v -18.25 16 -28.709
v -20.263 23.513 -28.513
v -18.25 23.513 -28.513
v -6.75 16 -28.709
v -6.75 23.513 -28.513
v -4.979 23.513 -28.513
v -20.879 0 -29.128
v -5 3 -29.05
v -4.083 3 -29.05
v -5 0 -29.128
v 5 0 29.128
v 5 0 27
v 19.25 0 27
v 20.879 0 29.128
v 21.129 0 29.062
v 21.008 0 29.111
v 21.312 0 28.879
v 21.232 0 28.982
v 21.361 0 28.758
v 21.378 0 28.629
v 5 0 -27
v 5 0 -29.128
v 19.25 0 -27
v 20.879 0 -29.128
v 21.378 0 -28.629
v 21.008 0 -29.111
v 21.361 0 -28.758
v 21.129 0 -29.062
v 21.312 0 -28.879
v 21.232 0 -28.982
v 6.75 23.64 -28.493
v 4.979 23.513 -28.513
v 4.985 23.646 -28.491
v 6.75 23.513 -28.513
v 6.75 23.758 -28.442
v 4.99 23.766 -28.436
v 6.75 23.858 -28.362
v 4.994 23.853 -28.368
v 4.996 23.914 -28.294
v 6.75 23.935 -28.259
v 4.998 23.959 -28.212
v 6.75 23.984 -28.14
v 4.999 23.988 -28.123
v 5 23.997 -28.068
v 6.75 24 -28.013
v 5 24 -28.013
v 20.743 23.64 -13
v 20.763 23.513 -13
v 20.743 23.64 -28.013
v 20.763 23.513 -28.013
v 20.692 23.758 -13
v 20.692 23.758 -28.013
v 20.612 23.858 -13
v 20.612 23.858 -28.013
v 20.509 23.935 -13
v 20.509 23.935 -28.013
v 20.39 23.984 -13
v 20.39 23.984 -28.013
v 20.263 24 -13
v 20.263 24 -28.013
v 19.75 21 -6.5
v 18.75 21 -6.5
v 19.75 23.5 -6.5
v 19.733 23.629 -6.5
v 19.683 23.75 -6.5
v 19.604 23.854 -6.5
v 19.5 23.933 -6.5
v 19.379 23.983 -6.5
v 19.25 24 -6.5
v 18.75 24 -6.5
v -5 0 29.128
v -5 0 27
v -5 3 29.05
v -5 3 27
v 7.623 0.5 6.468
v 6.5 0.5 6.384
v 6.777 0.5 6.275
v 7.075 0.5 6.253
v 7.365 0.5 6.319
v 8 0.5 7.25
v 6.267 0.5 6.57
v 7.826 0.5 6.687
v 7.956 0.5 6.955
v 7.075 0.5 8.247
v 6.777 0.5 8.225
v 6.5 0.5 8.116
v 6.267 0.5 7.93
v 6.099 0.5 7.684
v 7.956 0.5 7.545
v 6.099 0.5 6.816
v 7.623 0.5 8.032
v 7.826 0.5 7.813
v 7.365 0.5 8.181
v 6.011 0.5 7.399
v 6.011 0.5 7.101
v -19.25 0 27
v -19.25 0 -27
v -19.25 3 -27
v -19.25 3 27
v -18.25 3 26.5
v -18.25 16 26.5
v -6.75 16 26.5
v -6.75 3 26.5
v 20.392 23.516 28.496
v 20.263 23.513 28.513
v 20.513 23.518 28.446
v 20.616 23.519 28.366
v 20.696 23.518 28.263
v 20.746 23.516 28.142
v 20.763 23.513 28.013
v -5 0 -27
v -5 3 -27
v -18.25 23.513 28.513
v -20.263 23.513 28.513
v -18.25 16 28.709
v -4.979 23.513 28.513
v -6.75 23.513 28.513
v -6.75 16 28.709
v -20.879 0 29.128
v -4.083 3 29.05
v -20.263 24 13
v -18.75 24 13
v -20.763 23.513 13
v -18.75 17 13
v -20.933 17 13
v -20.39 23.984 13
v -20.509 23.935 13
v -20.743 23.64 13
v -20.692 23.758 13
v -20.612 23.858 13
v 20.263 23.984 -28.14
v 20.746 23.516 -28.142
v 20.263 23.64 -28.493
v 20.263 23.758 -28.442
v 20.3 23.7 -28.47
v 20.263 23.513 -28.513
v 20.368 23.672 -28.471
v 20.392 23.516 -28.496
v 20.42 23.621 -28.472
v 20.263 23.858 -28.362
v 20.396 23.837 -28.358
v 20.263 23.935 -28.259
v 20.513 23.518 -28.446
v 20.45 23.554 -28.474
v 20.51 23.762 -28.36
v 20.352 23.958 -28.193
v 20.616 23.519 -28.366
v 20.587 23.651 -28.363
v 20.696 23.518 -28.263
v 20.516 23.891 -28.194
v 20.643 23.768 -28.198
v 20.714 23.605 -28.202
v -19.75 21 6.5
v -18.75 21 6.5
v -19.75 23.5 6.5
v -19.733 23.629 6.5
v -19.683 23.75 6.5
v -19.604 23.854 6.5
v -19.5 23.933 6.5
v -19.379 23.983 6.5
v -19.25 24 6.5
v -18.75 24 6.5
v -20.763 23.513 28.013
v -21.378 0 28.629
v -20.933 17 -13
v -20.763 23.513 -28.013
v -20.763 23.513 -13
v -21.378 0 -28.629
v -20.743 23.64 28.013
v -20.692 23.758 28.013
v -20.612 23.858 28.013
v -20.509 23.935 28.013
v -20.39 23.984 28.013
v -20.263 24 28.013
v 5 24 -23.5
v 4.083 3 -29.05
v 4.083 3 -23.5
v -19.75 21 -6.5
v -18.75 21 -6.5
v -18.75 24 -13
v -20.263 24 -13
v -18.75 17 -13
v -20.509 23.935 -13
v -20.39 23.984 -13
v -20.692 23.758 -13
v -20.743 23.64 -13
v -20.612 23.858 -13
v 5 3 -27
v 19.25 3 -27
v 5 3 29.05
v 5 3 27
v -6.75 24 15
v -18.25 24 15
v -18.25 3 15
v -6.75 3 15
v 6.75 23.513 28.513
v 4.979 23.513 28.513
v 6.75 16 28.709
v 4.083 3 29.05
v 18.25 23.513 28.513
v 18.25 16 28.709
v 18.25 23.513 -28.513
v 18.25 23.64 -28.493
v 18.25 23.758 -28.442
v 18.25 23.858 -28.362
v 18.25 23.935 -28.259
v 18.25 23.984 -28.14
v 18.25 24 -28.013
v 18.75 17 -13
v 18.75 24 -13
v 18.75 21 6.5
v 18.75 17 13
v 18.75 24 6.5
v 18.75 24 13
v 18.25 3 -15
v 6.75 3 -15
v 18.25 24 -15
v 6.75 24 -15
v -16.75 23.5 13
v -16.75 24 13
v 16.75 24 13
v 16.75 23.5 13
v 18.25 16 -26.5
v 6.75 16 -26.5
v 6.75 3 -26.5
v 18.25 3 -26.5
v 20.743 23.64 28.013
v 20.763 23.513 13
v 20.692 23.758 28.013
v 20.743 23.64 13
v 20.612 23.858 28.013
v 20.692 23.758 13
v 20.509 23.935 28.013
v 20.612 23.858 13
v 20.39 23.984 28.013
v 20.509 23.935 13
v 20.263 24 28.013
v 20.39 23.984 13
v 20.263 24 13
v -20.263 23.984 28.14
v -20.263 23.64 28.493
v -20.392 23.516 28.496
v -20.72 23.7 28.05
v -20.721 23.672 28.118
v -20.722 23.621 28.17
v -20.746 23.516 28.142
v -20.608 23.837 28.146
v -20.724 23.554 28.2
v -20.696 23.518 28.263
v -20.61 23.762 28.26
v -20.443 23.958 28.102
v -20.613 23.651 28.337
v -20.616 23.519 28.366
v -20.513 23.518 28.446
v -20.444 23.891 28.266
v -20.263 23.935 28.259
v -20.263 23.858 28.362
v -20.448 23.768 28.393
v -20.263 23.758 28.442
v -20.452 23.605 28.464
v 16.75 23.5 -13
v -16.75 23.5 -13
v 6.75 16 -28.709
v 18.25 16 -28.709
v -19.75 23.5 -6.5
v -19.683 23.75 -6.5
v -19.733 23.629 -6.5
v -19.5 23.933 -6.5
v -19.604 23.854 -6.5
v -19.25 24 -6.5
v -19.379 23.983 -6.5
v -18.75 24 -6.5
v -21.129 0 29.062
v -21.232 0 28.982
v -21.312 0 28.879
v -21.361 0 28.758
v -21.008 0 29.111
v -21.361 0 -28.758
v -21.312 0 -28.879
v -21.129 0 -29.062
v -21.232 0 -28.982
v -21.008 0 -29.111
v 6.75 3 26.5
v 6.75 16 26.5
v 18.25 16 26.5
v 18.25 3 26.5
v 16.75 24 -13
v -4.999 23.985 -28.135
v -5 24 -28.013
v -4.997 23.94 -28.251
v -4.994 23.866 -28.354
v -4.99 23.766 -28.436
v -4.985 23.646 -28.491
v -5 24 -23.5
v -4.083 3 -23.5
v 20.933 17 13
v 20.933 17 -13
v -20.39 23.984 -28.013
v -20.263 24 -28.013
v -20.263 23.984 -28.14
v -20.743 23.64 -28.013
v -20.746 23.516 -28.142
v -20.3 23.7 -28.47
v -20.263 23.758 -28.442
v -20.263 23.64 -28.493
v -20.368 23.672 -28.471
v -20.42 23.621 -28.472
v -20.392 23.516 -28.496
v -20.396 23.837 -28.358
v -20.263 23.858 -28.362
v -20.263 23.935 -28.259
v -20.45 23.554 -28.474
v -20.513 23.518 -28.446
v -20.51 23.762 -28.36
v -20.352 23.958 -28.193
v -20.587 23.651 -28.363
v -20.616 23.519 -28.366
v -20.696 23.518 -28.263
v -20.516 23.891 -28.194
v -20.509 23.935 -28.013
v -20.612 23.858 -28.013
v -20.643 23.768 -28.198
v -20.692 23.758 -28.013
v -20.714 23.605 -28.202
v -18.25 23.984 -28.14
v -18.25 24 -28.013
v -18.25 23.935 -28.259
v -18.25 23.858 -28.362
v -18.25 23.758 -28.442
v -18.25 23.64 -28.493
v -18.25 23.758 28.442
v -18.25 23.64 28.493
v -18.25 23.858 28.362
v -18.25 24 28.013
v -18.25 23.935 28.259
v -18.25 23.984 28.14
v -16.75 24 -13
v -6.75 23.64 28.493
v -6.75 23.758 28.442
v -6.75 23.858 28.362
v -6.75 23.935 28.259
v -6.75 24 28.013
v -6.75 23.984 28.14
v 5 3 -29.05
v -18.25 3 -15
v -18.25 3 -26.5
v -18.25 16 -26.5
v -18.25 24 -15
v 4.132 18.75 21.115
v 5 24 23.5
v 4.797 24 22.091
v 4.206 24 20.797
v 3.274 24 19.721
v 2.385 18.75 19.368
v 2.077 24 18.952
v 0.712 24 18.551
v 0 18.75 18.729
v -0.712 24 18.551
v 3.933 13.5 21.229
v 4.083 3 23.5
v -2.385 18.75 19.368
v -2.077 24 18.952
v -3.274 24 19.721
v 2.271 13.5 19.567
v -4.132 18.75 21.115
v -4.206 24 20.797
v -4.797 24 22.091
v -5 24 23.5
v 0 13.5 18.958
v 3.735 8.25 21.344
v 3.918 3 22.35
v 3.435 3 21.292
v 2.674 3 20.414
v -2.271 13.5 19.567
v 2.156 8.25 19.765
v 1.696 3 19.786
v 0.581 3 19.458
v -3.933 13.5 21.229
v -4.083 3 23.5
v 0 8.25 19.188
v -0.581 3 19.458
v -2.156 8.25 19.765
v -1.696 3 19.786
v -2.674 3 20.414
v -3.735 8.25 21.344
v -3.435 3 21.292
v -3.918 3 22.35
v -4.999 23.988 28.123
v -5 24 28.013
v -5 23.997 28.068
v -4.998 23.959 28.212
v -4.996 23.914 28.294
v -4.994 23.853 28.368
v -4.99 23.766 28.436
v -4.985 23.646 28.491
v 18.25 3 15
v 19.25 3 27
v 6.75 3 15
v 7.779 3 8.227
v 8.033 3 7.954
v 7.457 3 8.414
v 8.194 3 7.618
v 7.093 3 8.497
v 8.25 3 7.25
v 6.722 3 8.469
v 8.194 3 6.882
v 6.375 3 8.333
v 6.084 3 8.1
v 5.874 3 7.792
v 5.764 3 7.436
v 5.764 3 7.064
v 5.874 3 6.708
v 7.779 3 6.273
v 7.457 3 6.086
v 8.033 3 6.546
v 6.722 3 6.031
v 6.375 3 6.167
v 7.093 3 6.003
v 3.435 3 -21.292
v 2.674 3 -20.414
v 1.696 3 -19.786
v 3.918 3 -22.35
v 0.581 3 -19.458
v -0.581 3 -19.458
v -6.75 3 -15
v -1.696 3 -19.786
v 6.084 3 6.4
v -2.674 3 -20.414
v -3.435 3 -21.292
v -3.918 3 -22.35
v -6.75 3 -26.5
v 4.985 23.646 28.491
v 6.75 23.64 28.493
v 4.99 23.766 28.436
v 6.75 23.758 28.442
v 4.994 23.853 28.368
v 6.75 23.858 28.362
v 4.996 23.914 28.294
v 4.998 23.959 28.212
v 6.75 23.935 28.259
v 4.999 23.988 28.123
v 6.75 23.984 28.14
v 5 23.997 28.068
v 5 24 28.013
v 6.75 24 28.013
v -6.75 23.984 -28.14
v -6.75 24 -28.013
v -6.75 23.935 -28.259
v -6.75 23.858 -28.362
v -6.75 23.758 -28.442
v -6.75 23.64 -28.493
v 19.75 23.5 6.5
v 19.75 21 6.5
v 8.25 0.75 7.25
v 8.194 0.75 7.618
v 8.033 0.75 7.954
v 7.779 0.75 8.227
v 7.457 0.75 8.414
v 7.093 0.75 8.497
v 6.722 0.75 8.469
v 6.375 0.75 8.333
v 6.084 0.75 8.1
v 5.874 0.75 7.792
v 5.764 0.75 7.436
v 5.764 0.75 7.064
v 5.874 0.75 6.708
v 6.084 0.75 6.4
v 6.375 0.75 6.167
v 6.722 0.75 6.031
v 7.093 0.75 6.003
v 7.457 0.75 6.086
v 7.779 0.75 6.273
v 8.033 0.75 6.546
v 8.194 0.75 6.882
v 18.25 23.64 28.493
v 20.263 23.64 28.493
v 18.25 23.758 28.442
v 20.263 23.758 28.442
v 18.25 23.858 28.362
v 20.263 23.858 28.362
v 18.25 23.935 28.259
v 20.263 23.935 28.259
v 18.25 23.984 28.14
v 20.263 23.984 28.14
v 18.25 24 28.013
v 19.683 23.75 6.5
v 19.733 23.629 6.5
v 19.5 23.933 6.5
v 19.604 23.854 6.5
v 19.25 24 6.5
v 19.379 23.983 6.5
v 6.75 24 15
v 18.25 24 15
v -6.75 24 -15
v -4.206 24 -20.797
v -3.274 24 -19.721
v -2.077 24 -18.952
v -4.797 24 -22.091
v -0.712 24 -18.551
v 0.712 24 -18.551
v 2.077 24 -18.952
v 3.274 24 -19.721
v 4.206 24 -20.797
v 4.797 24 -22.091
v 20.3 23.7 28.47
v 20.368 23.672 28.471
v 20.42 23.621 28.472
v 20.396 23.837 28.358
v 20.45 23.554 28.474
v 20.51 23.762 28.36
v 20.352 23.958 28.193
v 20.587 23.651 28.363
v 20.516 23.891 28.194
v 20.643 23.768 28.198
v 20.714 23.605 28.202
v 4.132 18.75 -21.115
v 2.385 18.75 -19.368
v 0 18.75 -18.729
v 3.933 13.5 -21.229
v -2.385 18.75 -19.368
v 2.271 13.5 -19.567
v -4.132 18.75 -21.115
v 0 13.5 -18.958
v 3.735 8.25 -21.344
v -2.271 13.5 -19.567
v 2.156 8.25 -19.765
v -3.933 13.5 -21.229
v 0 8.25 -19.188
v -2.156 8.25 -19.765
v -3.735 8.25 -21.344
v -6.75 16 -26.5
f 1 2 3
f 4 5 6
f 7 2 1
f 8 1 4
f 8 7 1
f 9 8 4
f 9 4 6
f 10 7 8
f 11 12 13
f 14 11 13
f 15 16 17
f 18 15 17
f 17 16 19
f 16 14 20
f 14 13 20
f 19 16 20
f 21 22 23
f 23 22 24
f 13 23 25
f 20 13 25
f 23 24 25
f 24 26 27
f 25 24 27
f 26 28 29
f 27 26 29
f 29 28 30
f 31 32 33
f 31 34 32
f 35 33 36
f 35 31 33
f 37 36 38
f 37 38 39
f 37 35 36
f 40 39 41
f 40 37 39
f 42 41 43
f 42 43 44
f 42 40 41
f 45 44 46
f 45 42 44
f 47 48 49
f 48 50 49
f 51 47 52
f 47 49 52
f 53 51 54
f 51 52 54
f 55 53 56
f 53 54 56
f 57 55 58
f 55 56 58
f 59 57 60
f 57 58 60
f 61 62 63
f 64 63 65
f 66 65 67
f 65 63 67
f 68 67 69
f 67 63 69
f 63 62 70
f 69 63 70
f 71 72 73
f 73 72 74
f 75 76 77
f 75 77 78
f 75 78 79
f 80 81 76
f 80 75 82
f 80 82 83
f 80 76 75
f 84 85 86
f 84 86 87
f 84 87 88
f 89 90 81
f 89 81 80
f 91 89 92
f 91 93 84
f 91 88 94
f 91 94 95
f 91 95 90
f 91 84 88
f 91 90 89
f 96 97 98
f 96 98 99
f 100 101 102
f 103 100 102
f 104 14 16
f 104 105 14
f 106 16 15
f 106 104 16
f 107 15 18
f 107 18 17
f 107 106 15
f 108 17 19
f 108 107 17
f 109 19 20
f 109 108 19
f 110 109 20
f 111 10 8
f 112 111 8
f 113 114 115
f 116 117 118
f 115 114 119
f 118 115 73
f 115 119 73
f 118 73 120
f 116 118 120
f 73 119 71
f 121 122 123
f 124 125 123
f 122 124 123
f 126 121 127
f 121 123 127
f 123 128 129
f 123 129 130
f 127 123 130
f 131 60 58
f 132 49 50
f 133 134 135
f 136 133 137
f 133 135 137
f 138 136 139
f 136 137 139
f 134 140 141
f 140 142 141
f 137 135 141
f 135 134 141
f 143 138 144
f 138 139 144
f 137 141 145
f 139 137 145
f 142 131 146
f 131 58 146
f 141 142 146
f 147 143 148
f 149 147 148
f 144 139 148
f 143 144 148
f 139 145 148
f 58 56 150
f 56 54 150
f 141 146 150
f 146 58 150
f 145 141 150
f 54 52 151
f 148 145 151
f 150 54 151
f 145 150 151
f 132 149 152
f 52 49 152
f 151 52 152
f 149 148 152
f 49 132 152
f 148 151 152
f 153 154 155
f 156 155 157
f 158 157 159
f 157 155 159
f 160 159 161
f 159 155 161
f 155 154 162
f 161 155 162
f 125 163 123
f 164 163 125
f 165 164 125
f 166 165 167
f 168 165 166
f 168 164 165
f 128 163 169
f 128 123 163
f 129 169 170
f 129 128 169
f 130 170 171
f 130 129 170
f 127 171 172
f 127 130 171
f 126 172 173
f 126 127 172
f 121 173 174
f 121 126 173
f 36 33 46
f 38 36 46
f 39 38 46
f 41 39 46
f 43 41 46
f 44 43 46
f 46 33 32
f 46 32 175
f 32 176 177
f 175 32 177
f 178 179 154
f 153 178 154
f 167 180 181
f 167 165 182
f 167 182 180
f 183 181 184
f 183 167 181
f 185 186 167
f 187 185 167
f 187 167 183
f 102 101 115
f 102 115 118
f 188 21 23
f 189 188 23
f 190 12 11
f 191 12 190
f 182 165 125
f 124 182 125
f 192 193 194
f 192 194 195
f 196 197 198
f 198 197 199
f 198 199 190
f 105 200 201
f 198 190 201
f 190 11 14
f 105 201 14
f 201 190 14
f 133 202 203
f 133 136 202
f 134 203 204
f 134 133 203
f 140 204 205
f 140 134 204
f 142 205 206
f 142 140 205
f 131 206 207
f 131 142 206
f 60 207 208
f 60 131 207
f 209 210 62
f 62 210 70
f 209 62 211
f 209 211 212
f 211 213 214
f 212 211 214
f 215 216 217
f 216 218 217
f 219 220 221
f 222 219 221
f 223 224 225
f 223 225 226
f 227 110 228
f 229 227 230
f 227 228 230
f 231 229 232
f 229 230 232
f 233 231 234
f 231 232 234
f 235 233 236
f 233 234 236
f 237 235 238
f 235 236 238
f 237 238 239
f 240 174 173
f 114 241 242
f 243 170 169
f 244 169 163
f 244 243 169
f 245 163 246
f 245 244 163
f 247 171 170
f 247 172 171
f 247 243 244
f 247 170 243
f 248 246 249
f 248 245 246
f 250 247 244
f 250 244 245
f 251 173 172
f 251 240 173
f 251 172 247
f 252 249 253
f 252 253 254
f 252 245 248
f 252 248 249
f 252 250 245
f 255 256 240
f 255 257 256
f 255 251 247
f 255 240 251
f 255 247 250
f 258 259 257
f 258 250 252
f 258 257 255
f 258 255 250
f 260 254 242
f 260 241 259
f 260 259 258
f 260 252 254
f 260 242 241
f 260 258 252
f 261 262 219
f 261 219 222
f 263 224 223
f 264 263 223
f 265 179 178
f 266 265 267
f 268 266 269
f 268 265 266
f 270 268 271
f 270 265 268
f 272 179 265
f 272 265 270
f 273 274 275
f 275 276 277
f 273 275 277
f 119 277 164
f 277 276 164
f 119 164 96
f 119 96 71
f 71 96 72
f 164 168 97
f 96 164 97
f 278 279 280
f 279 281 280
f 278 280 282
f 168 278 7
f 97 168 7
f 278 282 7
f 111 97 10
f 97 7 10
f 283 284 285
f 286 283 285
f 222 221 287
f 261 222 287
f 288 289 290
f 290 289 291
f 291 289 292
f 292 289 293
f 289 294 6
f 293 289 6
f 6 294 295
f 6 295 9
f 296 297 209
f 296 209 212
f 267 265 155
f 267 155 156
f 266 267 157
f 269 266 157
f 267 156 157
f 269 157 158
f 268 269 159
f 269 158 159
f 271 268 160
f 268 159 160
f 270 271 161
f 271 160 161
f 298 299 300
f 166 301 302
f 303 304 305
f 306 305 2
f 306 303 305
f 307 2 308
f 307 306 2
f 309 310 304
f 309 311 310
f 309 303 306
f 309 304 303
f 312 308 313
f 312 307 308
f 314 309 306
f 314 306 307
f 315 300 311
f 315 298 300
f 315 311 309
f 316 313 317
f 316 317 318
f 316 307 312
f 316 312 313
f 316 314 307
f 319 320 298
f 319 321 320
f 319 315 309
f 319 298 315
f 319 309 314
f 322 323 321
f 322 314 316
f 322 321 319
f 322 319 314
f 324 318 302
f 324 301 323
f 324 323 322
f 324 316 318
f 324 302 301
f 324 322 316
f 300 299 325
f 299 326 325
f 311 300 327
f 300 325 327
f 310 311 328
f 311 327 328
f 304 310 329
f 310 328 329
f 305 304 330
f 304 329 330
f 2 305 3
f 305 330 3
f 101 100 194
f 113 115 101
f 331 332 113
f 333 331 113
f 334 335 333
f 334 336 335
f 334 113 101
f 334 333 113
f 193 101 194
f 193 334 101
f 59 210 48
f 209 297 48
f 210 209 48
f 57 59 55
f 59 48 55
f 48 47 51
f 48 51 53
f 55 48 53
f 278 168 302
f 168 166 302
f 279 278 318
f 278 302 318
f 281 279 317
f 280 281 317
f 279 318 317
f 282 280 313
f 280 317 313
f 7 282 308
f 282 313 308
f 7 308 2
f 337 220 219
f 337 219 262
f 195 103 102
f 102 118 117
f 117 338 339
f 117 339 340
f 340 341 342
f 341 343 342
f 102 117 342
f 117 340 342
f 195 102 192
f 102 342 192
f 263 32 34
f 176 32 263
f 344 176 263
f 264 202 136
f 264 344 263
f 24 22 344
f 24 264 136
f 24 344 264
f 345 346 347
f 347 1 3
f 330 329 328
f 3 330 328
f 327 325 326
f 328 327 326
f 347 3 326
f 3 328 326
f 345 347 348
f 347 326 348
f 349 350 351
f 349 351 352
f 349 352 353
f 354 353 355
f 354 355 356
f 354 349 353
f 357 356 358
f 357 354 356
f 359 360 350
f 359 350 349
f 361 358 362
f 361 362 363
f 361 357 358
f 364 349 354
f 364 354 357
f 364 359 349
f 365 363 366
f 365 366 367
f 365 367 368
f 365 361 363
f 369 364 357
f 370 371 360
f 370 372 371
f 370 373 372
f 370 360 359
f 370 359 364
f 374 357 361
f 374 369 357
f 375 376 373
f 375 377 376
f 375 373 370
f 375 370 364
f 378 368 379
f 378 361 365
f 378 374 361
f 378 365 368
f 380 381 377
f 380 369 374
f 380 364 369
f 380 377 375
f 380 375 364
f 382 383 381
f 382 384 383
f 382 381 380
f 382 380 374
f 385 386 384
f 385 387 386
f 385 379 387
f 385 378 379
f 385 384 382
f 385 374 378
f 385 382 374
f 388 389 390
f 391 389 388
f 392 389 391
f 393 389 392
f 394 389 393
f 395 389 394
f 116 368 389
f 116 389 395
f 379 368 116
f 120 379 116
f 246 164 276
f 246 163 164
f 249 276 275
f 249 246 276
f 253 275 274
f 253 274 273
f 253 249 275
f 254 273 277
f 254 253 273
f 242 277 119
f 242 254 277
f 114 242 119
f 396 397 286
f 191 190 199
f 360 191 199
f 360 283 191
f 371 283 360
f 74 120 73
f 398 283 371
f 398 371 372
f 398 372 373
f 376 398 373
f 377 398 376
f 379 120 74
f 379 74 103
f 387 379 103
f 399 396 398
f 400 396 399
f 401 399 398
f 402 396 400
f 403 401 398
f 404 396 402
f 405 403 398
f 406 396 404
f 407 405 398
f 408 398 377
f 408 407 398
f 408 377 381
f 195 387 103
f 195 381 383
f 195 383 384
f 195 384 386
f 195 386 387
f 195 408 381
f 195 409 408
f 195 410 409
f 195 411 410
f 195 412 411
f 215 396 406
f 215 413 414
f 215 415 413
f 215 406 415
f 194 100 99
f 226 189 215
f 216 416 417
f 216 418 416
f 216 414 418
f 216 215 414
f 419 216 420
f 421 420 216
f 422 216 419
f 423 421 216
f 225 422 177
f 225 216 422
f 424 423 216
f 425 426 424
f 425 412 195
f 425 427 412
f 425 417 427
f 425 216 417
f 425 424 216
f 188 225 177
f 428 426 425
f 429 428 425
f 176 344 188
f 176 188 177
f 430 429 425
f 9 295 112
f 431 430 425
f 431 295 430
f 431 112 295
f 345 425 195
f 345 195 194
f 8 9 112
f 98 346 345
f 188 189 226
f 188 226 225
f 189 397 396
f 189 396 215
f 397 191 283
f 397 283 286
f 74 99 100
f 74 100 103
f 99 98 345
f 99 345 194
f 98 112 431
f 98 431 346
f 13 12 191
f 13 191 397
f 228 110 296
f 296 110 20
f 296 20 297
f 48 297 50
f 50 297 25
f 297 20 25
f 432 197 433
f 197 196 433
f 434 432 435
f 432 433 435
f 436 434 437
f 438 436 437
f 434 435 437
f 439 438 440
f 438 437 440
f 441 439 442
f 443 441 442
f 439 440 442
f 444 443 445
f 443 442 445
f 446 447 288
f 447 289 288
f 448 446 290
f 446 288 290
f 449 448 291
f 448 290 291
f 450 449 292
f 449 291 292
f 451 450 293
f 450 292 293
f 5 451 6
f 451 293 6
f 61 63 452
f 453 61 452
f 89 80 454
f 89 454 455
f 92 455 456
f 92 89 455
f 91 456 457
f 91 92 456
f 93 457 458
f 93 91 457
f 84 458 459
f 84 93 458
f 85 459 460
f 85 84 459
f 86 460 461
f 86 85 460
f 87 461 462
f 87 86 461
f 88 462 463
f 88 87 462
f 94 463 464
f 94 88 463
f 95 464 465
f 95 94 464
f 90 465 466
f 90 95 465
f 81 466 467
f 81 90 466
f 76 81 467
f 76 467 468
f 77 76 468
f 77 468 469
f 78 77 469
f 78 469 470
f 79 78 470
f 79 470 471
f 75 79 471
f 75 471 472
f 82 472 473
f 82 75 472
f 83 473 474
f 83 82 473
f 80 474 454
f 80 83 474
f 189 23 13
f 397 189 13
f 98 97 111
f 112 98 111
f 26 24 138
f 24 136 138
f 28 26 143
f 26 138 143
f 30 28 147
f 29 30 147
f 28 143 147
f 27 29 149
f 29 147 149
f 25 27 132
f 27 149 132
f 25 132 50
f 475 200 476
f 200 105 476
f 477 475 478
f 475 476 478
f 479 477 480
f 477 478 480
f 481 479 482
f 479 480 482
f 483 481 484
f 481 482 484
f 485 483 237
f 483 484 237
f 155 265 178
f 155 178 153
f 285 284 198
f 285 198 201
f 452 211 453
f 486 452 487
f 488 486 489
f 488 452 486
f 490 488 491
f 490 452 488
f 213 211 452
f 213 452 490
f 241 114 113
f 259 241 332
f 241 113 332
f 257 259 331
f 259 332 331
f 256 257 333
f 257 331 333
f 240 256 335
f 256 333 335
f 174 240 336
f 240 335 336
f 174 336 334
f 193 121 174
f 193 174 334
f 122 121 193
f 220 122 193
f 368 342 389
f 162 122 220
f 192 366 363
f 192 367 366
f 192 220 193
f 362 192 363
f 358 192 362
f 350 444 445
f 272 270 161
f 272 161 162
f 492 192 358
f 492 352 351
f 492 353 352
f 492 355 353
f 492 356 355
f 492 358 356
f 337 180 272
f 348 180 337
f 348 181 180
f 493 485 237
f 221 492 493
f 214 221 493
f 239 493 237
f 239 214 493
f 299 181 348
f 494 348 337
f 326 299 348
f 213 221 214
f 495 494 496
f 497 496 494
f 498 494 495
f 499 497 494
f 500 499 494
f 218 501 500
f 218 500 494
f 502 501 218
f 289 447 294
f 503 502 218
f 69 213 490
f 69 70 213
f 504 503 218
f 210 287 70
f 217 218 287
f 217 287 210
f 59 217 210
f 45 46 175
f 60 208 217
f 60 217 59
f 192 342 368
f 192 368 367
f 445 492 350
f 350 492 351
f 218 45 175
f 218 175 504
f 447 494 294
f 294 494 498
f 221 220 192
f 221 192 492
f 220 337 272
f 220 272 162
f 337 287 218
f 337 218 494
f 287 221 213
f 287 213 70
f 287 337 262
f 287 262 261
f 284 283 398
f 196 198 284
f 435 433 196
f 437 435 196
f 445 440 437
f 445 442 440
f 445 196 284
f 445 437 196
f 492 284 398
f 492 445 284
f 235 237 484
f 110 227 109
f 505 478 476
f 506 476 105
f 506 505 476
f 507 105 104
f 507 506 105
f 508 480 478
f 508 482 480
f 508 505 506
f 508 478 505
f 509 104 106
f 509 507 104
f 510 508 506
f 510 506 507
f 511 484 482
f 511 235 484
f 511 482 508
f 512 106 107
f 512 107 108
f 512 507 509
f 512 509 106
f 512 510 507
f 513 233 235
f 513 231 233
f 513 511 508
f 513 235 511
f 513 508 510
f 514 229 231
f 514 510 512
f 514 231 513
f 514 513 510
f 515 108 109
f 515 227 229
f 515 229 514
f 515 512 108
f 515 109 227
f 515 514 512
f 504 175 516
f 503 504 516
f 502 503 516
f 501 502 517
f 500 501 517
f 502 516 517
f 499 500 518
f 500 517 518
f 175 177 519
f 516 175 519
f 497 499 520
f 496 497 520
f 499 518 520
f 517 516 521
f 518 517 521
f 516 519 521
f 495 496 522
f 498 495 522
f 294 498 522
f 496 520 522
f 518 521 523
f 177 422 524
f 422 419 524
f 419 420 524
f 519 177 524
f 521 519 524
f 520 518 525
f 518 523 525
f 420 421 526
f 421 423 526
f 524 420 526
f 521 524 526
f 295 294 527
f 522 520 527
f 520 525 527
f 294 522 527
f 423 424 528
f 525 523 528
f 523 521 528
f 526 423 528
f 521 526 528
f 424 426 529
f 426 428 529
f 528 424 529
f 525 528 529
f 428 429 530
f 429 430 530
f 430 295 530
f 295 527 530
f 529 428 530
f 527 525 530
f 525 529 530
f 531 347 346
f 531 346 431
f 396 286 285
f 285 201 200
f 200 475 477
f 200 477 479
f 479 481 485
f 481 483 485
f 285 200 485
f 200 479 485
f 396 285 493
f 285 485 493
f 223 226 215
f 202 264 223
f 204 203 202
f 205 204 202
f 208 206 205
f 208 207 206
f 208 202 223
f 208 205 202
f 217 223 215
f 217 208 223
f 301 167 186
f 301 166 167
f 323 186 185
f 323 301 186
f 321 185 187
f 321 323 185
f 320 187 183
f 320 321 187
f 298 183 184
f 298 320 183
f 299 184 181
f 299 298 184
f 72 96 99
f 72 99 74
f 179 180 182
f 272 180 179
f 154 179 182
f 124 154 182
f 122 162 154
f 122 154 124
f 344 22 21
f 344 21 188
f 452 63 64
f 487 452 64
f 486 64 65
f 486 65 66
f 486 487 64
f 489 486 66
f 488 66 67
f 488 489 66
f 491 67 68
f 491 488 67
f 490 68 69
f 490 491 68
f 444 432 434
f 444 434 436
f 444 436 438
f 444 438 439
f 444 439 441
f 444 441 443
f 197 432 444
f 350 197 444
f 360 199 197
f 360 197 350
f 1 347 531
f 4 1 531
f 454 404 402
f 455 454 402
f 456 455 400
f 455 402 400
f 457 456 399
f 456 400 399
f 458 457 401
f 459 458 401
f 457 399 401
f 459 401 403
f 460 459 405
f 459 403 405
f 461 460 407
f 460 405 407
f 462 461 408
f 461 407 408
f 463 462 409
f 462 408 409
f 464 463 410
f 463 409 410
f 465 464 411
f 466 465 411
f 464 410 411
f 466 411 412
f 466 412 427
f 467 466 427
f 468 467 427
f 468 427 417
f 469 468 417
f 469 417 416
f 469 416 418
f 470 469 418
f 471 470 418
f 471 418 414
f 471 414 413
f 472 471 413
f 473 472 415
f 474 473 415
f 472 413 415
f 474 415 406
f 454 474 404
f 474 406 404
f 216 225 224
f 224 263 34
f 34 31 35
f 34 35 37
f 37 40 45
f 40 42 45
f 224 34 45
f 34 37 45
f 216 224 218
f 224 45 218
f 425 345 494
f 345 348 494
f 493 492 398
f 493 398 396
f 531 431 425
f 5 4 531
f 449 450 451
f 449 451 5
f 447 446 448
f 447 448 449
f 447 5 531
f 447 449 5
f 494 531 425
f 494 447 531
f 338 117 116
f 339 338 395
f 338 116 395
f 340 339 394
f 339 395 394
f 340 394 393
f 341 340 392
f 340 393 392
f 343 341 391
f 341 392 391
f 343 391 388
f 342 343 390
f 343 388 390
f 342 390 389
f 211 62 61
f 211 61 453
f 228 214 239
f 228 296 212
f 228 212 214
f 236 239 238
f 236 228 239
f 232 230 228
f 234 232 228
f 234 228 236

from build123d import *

# Parameters (mm, degrees)
SKETCH1_W           = 41.5
SKETCH1_H           = 57
BOSS_EXTRUDE1_DEPTH = 24
CUT_EXTRUDE1_DEPTH  = 21
CUT_EXTRUDE1_TAPER  = 2.5
SKETCH3_W           = 11.5
SKETCH3_H           = 13.5
CUT_EXTRUDE2_DEPTH  = 8
SKETCH4_W           = 11.5
SKETCH4_H           = 11.5
CUT_EXTRUDE3_DEPTH  = 17.0000001
SKETCH5_W           = 26
SKETCH5_H           = 7
CUT_EXTRUDE4_DEPTH  = 2
SKETCH6_W           = 13
SKETCH6_H           = 3
BOSS_EXTRUDE2_DEPTH = 1
SKETCH7_W           = 33.5
SKETCH7_H           = 26
CUT_EXTRUDE5_DEPTH  = 0.5
SKETCH8_W           = 38.5
SKETCH8_H           = 54
CUT_EXTRUDE6_DEPTH  = 3
SKETCH9_W           = 10
SKETCH9_H           = 3
CUT_EXTRUDE7_DEPTH  = 58.0000001
DRAFT1_ANGLE        = 1.5
FILLET1_R           = 0.5
SKETCH10_R          = 1.25
BOSS_EXTRUDE3_DEPTH = 2.5
CHAMFER1_SIZE       = 0.25


with BuildPart() as part:
    # Sketch1 → Boss-Extrude1 (new body)
    with BuildSketch(Plane(origin=(0, 0, 0), x_dir=(1, 0, 0), z_dir=(0, 1, 0))):
        Rectangle(SKETCH1_W, SKETCH1_H)
    extrude(amount=BOSS_EXTRUDE1_DEPTH)

    # Sketch2 → Cut-Extrude1 (cut)
    with BuildSketch(Plane(origin=(0, 24, 0), x_dir=(1, 0, 0), z_dir=(0, 1, 0))):
        with BuildLine():
            Line((-5, -23.5), (-5, -30.5))
            Line((-5, -30.5), (5, -30.5))
            Line((5, -30.5), (5, -23.5))
            ThreePointArc((5, -23.5), (0, -18.5), (-5, -23.5))
        make_face()
    cut_extrude1 = extrude(amount=-CUT_EXTRUDE1_DEPTH, taper=CUT_EXTRUDE1_TAPER, mode=Mode.SUBTRACT)

    # Sketch3 → Cut-Extrude2 (cut)
    with BuildSketch(Plane(origin=(0, 24, 0), x_dir=(1, 0, 0), z_dir=(0, 1, 0))):
        with Locations((-12.5, -21.75)):
            Rectangle(SKETCH3_W, SKETCH3_H)
        with Locations((12.5, -21.75)):
            Rectangle(SKETCH3_W, SKETCH3_H)
    cut_extrude2 = extrude(amount=-CUT_EXTRUDE2_DEPTH, mode=Mode.SUBTRACT)

    # Sketch4 → Cut-Extrude3 (cut, through all)
    with BuildSketch(Plane(origin=(0, 16, 0), x_dir=(1, 0, 0), z_dir=(0, 1, 0))):
        with Locations((-12.5, -20.75)):
            Rectangle(SKETCH4_W, SKETCH4_H)
        with Locations((12.5, -20.75)):
            Rectangle(SKETCH4_W, SKETCH4_H)
    cut_extrude3 = extrude(amount=-CUT_EXTRUDE3_DEPTH, mode=Mode.SUBTRACT)

    # Mirror1: Cut-Extrude1, Cut-Extrude2, Cut-Extrude3 across plane
    add(cut_extrude1.mirror(Plane.XY), mode=Mode.SUBTRACT)
    add(cut_extrude2.mirror(Plane.XY), mode=Mode.SUBTRACT)
    add(cut_extrude3.mirror(Plane.XY), mode=Mode.SUBTRACT)

    # Sketch5 → Cut-Extrude4 (cut)
    with BuildSketch(Plane.ZY.offset(20.75)):
        with Locations((0, 20.5)):
            Rectangle(SKETCH5_W, SKETCH5_H)
    cut_extrude4 = extrude(amount=-CUT_EXTRUDE4_DEPTH, mode=Mode.SUBTRACT)

    # Sketch6 → Boss-Extrude2 (add)
    with BuildSketch(Plane.ZY.offset(18.75)):
        with Locations((0, 22.5)):
            Rectangle(SKETCH6_W, SKETCH6_H)
    boss_extrude2 = extrude(amount=BOSS_EXTRUDE2_DEPTH)

    # Mirror2: Cut-Extrude4, Boss-Extrude2 across plane
    add(cut_extrude4.mirror(Plane(origin=(0, 0, 0), x_dir=(0, 0, 1), z_dir=(1, 0, 0))), mode=Mode.SUBTRACT)
    add(boss_extrude2.mirror(Plane(origin=(0, 0, 0), x_dir=(0, 0, 1), z_dir=(1, 0, 0))))

    # Sketch7 → Cut-Extrude5 (cut)
    with BuildSketch(Plane(origin=(0, 24, 0), x_dir=(1, 0, 0), z_dir=(0, 1, 0))):
        Rectangle(SKETCH7_W, SKETCH7_H)
    extrude(amount=-CUT_EXTRUDE5_DEPTH, mode=Mode.SUBTRACT)

    # Sketch8 → Cut-Extrude6 (cut)
    with BuildSketch(Plane.XZ):
        Rectangle(SKETCH8_W, SKETCH8_H)
    extrude(amount=-CUT_EXTRUDE6_DEPTH, mode=Mode.SUBTRACT)

    # Sketch9 → Cut-Extrude7 (cut, through all)
    with BuildSketch(Plane(origin=(0, 0, -28.5), x_dir=(-1, 0, 0), z_dir=(0, 0, -1))):
        with Locations((0, 1.5)):
            Rectangle(SKETCH9_W, SKETCH9_H)
    extrude(amount=-CUT_EXTRUDE7_DEPTH, mode=Mode.SUBTRACT)

    # Draft1
    draft1_faces = [part.faces().sort_by_distance(p)[0] for p in [
        (-12.725295126, 9.445247328, -28.5),
        (12.725295126, 9.445247328, -28.5),
        (-20.75, 10.695615514, 0),
        (-12.725295126, 9.445247328, 28.5),
        (12.725295126, 9.445247328, 28.5),
        (20.75, 10.695615514, 0),
    ]]
    draft(draft1_faces, Plane.ZX.offset(24), DRAFT1_ANGLE)

    # Fillet1
    fillet1_edges = [part.edges().sort_by_distance(p)[0] for p in [
        (-20.75, 24, -20.75),
        (-19.5, 24, -28.5),
        (5.875, 24, -28.5),
        (-19.5, 24, 28.5),
        (5.875, 24, 28.5),
        (-20.75, 24, 20.75),
        (-19.75, 24, 0),
        (20.75, 24, -20.75),
        (19.75, 24, 0),
        (-5.875, 24, 28.5),
        (20.75, 24, 20.75),
        (19.5, 24, 28.5),
        (19.5, 24, -28.5),
        (21.064231059, 12, 28.814231059),
        (-21.064231059, 12, 28.814231059),
        (-21.064231059, 12, -28.814231059),
        (21.064231059, 12, -28.814231059),
        (-5.875, 24, -28.5),
    ]]
    fillet(fillet1_edges, radius=FILLET1_R)

    # Sketch10 → Boss-Extrude3 (add)
    with BuildSketch(Plane.XZ.offset(-3)):
        with Locations((7, 7.25)):
            Circle(SKETCH10_R)
    extrude(amount=BOSS_EXTRUDE3_DEPTH)

    # Chamfer1
    chamfer1_edges = [part.edges().sort_by_distance(p)[0] for p in [
        (5.75, 0.5, 7.25),
    ]]
    chamfer(chamfer1_edges, length=CHAMFER1_SIZE)


solid = part.part
